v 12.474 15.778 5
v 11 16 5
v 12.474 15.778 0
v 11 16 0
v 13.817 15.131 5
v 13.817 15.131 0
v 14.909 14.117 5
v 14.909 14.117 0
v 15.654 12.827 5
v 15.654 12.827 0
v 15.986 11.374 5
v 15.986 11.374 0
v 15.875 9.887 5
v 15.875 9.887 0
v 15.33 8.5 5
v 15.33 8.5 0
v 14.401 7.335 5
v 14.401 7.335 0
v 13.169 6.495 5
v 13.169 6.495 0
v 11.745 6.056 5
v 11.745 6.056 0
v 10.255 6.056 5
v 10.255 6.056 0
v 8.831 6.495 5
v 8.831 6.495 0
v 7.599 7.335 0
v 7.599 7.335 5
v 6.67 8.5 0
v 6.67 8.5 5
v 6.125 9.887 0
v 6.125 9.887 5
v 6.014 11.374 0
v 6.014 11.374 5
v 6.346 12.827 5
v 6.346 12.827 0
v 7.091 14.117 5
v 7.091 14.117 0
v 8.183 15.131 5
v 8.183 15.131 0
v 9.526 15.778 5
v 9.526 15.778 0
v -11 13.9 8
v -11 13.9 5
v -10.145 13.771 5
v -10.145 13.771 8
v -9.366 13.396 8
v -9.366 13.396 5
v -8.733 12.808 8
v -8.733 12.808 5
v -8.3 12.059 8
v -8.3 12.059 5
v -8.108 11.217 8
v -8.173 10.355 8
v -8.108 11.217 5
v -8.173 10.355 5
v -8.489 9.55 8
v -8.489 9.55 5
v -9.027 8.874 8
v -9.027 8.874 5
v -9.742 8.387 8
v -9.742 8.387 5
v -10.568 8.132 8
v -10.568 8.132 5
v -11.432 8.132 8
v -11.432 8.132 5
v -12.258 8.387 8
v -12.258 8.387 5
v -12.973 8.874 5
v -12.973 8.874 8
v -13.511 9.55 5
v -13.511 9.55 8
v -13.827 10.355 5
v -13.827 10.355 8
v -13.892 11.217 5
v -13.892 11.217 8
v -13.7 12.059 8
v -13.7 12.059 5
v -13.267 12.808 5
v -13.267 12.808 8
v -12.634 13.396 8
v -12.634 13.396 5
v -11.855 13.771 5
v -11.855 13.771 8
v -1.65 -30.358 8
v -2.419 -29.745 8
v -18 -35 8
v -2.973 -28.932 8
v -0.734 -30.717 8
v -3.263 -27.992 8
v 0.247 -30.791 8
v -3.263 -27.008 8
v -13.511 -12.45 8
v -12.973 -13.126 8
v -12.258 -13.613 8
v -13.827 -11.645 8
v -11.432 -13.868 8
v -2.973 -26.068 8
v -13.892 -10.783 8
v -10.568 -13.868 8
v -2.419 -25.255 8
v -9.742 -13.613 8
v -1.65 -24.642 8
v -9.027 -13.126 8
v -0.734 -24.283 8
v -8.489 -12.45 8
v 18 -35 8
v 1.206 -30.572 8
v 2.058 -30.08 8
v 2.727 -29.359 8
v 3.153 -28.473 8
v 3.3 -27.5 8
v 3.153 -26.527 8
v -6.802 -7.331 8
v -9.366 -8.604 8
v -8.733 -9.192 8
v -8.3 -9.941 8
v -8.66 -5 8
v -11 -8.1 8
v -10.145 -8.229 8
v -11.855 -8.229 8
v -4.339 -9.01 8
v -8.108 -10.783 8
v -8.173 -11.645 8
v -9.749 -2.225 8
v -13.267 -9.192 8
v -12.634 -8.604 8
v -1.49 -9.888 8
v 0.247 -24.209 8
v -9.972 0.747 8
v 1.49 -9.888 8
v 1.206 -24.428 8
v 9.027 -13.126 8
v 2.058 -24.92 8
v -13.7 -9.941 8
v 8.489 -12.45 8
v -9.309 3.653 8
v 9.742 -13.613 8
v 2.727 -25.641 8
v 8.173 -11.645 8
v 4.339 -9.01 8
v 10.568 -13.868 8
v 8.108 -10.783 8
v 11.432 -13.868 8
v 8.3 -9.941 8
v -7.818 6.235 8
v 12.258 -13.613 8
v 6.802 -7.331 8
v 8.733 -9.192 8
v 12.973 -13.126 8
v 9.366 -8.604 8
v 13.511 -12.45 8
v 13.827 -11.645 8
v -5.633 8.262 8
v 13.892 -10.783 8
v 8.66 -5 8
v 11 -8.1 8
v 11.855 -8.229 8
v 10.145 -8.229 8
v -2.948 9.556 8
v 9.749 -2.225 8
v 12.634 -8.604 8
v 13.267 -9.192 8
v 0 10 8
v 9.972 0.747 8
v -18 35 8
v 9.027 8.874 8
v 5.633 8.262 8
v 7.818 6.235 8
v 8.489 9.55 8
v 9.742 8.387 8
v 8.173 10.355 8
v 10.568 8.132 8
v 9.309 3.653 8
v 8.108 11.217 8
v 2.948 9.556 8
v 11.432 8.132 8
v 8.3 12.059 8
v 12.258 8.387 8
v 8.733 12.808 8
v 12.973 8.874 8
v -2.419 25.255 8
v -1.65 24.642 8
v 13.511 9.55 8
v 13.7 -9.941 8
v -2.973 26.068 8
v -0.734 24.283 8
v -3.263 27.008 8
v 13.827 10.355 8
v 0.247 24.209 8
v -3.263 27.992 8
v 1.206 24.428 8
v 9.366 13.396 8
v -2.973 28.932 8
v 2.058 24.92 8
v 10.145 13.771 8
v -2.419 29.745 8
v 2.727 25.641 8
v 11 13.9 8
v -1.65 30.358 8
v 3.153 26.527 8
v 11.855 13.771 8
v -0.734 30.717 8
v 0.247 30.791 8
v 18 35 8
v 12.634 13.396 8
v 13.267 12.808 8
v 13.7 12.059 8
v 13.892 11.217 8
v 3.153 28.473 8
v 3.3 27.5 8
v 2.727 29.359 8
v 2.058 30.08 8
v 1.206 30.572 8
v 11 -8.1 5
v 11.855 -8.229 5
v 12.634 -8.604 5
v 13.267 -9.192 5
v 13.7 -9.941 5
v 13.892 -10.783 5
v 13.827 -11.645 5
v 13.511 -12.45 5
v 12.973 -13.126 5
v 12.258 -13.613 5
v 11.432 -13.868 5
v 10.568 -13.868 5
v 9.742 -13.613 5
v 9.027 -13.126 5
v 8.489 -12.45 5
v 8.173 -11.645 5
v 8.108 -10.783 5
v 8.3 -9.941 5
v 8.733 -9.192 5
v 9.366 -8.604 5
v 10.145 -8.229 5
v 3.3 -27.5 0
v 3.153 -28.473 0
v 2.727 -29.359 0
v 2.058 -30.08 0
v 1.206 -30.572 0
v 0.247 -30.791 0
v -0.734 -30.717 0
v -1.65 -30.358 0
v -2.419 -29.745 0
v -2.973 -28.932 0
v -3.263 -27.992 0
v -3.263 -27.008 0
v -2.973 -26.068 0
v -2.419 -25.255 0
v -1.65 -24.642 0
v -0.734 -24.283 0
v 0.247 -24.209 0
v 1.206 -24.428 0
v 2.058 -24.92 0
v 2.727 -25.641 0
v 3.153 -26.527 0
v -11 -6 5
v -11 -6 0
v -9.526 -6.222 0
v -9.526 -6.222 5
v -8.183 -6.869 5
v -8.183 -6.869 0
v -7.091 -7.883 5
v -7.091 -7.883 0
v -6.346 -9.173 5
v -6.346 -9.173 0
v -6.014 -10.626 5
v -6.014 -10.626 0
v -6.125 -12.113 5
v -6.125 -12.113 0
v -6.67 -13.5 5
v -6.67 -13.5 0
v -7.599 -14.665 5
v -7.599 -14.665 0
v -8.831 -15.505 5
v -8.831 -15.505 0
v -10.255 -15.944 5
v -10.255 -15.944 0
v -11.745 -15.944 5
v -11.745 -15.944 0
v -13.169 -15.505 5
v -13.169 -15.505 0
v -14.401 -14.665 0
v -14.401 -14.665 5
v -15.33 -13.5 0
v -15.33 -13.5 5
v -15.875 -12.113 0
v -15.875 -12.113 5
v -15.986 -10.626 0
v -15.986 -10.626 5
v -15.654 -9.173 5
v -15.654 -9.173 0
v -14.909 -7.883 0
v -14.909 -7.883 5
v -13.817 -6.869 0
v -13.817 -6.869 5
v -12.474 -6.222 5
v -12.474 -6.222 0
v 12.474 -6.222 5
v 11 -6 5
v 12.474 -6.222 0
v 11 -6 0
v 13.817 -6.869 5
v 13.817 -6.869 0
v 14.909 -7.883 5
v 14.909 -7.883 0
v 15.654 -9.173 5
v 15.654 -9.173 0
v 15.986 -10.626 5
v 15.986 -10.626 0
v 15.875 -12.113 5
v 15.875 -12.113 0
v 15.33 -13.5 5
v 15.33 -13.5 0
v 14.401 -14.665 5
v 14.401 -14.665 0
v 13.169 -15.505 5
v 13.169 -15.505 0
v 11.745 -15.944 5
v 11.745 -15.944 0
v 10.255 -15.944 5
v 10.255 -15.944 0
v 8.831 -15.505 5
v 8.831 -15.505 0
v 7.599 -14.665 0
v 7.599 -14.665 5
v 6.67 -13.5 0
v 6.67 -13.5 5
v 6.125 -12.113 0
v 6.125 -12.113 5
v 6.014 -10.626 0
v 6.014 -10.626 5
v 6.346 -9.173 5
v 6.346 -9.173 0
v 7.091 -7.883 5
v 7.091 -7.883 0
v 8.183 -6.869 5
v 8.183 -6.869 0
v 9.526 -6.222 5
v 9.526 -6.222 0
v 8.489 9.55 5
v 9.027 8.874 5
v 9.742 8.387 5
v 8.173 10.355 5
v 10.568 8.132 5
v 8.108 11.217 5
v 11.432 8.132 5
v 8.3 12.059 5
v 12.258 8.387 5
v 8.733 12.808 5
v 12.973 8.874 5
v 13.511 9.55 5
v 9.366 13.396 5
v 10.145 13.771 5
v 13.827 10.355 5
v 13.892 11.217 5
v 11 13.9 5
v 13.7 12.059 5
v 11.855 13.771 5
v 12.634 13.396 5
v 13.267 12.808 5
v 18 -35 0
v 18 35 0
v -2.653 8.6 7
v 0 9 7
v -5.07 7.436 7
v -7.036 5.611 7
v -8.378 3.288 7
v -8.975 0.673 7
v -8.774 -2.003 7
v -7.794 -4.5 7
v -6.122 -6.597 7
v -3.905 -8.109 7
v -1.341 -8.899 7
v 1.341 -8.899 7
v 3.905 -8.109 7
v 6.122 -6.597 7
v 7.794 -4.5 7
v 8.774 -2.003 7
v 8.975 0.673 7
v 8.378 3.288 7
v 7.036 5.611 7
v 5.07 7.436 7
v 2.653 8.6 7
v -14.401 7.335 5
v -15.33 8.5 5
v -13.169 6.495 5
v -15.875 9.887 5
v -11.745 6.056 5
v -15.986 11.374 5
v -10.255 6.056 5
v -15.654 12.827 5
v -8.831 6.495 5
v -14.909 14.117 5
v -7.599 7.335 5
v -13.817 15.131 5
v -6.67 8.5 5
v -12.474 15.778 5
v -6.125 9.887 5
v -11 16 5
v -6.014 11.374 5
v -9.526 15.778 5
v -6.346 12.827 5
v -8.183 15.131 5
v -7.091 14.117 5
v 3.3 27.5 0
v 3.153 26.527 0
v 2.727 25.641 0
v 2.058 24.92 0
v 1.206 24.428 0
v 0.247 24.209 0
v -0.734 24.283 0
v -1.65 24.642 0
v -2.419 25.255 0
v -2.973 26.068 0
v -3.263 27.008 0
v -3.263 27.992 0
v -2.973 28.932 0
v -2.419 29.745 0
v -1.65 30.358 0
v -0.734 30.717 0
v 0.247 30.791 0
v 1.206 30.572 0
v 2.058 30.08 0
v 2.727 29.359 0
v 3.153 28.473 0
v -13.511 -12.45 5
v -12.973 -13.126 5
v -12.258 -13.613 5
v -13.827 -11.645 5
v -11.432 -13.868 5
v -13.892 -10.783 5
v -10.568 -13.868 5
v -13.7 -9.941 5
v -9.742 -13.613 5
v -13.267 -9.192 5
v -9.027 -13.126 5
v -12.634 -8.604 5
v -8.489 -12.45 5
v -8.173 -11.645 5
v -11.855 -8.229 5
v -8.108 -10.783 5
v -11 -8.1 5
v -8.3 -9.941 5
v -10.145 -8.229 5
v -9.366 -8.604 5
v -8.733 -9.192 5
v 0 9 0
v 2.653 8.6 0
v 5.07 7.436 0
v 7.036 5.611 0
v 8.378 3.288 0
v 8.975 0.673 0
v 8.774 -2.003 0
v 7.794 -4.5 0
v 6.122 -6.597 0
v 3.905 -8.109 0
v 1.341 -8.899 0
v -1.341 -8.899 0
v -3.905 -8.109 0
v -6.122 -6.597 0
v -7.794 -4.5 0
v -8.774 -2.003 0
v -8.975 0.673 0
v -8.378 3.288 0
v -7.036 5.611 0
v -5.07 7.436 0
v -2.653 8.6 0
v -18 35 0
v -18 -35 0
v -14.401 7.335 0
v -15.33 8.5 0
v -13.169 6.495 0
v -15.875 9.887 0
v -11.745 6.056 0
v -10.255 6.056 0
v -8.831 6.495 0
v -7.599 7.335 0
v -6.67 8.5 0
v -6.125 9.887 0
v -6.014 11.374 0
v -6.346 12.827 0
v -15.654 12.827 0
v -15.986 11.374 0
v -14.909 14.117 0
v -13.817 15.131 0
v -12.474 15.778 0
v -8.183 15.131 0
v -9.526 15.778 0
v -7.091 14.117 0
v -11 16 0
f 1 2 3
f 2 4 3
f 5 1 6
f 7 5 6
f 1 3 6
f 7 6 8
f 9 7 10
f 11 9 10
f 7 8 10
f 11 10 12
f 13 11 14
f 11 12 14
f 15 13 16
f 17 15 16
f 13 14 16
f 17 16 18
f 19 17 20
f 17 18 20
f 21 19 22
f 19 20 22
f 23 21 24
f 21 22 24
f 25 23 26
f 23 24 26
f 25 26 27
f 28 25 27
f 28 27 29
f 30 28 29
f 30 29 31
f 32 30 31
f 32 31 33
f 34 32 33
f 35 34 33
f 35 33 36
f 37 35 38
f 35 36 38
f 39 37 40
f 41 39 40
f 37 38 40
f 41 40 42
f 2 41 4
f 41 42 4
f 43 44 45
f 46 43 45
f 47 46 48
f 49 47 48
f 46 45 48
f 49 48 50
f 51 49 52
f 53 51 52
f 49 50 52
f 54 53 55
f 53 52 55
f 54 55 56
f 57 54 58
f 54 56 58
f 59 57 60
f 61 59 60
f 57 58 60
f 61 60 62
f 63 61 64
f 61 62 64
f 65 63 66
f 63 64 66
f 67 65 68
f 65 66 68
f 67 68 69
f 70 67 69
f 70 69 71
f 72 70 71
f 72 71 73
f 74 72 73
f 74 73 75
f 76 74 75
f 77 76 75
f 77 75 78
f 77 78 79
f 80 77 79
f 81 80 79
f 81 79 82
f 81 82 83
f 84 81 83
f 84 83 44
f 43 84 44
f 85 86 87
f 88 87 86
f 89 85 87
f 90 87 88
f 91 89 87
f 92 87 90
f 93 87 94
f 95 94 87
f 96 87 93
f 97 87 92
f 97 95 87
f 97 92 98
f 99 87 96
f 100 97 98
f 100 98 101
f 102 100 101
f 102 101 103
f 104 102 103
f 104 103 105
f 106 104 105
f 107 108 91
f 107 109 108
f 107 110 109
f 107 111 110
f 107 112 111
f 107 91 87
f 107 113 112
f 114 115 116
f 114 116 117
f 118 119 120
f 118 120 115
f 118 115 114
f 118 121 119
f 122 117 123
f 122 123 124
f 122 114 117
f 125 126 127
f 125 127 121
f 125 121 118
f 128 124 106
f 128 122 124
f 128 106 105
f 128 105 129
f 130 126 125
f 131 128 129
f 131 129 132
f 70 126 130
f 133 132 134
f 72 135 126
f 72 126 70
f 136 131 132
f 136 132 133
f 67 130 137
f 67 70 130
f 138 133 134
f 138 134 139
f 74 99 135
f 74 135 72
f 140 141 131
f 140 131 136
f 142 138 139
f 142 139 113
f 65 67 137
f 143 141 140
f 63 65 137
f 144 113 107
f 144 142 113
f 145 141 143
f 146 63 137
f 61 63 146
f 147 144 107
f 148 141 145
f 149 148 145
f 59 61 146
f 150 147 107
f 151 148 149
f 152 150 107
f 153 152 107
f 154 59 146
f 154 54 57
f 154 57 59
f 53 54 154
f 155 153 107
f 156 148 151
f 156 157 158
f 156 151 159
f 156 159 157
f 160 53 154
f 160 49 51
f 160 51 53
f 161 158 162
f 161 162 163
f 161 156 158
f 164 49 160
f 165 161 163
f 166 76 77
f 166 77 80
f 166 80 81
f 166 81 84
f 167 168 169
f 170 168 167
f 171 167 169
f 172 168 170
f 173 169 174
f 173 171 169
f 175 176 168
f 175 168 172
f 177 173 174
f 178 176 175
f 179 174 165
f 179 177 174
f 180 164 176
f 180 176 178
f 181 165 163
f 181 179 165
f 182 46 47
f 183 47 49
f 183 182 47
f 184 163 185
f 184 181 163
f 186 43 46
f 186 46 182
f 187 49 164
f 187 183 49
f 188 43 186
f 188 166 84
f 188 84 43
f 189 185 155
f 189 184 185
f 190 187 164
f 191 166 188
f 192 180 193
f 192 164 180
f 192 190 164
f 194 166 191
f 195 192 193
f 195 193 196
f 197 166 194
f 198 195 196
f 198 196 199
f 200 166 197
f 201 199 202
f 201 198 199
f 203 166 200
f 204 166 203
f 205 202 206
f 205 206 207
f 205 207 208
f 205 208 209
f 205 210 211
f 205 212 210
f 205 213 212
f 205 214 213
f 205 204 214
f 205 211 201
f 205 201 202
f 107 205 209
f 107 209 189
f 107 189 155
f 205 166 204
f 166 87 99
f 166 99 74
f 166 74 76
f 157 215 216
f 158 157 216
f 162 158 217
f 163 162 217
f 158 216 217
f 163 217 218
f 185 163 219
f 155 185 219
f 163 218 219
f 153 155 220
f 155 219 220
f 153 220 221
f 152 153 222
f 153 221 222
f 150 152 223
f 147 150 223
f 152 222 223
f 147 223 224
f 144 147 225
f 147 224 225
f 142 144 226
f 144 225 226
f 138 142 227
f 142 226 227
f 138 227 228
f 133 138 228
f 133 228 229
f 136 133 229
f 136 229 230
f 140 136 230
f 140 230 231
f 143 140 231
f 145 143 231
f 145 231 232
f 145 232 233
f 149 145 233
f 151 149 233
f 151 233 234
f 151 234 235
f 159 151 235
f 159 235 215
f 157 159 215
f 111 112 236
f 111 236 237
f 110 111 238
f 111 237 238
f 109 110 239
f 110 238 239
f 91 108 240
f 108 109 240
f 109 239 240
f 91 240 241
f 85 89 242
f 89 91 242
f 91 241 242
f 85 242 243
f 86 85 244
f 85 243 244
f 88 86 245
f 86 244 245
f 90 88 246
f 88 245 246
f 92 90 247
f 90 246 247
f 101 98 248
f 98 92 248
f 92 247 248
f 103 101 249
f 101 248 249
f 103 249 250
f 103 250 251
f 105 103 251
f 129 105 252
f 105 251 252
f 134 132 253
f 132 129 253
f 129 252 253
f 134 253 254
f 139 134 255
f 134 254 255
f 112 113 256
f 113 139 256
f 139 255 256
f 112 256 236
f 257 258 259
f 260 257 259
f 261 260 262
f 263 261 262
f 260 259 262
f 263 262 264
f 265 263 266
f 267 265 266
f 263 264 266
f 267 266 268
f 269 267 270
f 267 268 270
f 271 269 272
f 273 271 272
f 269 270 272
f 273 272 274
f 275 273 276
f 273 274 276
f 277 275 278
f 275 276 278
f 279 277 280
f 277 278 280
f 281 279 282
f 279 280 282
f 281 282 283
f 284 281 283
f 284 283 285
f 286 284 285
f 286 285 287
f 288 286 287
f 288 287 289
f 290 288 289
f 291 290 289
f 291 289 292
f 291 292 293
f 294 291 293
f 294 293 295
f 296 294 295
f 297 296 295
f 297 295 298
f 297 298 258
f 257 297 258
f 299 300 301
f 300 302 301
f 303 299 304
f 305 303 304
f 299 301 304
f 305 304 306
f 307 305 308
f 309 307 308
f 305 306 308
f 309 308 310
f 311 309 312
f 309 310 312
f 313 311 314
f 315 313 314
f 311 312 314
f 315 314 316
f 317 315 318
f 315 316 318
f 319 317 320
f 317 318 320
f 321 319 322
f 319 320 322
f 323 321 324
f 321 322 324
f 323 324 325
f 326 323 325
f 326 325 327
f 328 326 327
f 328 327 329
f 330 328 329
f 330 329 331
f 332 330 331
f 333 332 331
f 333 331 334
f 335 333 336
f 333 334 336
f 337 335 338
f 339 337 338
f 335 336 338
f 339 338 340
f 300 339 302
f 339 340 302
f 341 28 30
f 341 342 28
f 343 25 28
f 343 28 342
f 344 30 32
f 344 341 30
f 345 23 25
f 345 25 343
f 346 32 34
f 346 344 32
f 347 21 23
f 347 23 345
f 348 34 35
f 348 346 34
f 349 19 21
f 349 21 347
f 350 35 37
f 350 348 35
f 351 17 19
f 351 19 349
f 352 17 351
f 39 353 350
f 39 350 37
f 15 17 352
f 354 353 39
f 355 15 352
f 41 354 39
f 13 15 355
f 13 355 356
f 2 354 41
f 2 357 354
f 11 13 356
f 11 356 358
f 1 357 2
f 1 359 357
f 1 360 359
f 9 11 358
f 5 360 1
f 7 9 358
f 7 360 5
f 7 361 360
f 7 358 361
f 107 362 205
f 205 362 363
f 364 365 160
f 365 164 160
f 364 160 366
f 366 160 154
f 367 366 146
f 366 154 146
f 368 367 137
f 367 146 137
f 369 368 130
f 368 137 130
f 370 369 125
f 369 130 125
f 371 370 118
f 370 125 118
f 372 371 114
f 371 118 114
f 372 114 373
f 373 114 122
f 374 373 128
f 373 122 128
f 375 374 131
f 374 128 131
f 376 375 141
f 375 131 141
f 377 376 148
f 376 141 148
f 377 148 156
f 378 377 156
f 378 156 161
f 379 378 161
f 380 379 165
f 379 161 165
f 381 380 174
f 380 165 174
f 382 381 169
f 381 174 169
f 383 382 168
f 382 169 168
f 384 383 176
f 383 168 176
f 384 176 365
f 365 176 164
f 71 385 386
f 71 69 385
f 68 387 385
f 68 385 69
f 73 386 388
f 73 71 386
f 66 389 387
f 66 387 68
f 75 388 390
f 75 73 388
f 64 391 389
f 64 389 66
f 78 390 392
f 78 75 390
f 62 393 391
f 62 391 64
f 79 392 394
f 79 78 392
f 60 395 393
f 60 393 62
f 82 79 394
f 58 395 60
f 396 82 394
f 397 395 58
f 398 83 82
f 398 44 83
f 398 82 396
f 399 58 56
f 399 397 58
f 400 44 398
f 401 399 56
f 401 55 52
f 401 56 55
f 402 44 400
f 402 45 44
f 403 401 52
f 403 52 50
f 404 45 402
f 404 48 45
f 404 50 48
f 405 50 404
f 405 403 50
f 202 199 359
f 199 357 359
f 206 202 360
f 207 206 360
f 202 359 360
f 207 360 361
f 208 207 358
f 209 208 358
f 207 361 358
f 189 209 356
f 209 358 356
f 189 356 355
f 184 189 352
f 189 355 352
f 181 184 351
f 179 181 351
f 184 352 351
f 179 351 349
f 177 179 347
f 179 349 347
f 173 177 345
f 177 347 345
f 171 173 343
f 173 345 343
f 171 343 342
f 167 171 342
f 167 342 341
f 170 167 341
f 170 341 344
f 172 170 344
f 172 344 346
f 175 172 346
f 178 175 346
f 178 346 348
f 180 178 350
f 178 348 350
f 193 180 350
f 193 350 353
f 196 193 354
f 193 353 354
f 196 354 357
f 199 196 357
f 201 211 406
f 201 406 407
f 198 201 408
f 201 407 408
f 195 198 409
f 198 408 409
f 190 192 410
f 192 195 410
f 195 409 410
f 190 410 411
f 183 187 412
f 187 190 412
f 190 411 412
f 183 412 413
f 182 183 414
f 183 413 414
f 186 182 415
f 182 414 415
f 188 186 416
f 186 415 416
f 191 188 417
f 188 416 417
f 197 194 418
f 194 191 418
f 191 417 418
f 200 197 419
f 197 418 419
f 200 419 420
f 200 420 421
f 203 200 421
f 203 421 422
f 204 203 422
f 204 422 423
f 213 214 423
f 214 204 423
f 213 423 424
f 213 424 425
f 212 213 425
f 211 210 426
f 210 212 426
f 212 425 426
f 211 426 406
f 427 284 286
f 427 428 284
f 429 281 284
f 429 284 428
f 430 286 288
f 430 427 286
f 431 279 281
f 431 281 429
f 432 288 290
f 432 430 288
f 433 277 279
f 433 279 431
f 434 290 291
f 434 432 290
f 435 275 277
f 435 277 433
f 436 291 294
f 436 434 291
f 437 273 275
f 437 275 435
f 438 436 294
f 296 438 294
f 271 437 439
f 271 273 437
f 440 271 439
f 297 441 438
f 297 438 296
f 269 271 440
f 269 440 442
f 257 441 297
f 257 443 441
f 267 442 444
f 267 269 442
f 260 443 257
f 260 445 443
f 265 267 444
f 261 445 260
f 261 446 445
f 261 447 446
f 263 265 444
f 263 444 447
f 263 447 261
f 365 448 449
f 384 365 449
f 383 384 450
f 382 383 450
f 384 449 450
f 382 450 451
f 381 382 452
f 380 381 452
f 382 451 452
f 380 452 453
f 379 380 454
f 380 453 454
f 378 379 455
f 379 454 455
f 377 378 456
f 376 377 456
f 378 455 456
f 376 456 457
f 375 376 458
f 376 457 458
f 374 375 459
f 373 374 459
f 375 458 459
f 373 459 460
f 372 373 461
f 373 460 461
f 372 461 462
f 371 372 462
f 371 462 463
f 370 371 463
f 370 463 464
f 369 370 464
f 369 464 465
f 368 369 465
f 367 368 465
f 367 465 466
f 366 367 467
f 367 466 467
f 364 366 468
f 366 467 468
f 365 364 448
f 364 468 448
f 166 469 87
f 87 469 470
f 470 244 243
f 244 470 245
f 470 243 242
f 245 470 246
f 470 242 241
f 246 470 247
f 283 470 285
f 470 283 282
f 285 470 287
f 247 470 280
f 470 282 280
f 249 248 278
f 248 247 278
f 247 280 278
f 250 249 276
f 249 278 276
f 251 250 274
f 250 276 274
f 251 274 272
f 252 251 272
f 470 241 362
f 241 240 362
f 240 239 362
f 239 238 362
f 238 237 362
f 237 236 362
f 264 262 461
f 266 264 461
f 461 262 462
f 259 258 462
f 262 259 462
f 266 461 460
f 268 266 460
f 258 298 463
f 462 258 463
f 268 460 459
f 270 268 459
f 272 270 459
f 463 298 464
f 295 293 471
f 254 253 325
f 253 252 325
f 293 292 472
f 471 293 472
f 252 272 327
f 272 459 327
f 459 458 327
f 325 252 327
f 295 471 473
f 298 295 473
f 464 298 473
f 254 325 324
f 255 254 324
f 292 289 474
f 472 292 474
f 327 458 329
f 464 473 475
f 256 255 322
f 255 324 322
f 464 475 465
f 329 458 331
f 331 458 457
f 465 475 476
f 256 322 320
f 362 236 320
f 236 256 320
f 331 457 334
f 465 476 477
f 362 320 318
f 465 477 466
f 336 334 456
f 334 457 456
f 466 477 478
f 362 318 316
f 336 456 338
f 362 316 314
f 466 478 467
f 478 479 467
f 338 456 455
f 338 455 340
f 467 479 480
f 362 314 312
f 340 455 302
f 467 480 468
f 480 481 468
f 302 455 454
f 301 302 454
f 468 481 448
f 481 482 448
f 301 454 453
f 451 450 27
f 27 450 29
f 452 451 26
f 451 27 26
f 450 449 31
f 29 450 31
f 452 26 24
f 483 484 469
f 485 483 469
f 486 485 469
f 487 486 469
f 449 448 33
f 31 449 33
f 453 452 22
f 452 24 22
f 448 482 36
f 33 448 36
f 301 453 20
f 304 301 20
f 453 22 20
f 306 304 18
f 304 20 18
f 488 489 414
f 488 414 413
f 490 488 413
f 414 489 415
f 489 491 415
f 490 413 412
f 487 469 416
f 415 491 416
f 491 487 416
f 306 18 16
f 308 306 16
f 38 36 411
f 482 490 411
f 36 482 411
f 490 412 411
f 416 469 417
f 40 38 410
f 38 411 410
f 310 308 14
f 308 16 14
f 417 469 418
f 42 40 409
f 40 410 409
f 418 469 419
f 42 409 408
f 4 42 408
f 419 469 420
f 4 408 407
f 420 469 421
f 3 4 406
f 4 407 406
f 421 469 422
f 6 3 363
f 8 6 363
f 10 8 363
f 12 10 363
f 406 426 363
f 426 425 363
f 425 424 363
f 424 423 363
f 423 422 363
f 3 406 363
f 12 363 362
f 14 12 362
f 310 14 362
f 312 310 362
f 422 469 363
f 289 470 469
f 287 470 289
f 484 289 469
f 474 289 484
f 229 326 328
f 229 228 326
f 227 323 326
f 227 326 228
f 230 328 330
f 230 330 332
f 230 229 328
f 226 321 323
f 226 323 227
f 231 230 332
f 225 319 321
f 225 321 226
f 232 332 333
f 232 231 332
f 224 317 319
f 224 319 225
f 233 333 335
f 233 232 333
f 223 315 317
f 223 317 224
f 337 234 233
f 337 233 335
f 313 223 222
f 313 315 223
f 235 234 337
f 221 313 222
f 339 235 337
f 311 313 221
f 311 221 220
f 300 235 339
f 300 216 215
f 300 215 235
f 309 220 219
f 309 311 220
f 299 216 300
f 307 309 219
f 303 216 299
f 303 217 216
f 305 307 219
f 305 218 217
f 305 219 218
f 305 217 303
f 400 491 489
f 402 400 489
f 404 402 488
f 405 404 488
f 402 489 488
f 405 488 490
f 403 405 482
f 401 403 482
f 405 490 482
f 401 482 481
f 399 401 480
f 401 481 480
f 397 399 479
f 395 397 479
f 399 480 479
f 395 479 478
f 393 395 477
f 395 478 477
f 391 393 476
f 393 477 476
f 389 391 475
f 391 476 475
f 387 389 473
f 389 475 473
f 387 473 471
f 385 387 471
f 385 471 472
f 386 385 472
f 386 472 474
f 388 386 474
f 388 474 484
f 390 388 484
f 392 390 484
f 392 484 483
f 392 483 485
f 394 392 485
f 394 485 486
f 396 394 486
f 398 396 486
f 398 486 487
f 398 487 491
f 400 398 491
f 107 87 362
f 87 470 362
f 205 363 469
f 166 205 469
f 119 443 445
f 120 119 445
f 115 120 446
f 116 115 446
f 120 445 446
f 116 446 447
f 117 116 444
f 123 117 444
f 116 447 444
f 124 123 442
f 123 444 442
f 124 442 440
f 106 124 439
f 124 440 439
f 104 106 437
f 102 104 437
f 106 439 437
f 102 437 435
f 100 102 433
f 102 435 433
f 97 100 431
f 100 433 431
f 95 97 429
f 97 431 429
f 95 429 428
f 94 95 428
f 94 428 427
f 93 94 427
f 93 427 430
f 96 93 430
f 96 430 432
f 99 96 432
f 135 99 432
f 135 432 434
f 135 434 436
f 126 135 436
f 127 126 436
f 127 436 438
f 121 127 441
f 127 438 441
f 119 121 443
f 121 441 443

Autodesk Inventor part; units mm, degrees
sketch "Skizze_1" plane through (0, 0, 0) normal (0, 0, 1) x (1, 0, 0)
  line L0 (-18, 35) -> (-18, -35)
  line L1 (-18, -35) -> (18, -35)
  line L2 (18, -35) -> (18, 35)
  line L3 (18, 35) -> (-18, 35)
  circle A0 centre (0, 27.5) radius 3.3
  circle A1 centre (0, -27.5) radius 3.3
extrude "Extrusion1" add sketch "Skizze_1" along normal blind 8
sketch "Skizze_2_ALT_Drilling_1" plane through (0, 0, 0) normal (1, 0, 0) x (0, 1, 0)
  line L0 (0, 0) -> (0, 8)
  line L1 (0, 8) -> (10, 8)
  line L2 (10, 8) -> (9, 7)
  line L3 (9, 7) -> (9, 0)
  line L4 (9, 0) -> (0, 0)
  line L5 (0, 0) -> (0, 8)
revolve "Revolution1" cut sketch "Skizze_2_ALT_Drilling_1" angle 360 about axis through (0, 0, 0) along (0, 0, -1)
sketch "Skizze_3_ALT_Drilling_2" plane through (11, 0, 0) normal (1, 0, 0) x (0, 0, -1)
  line L0 (0, 11) -> (-8, 11)
  line L1 (-8, 11) -> (-8, 13.9)
  line L2 (-8, 13.9) -> (-5, 13.9)
  line L3 (-5, 13.9) -> (-5, 16)
  line L4 (-5, 16) -> (0, 16)
  line L5 (0, 16) -> (0, 11)
  line L6 (0, 11) -> (-8, 11)
revolve "Revolution2" cut sketch "Skizze_3_ALT_Drilling_2" angle 360 about axis through (11, 11, 0) along (0, 0, -1)
sketch "Muster_1_SKETCH_1" plane through (-11, 0, 0) normal (1, 0, 0) x (0, 0, -1)
  line L0 (0, 11) -> (-8, 11)
  line L1 (-8, 11) -> (-8, 13.9)
  line L2 (-8, 13.9) -> (-5, 13.9)
  line L3 (-5, 13.9) -> (-5, 16)
  line L4 (-5, 16) -> (0, 16)
  line L5 (0, 16) -> (0, 11)
  line L6 (0, 11) -> (-8, 11)
sketch "Muster_1_SKETCH_2" plane through (11, 0, 0) normal (1, 0, 0) x (0, 0, -1)
  line L0 (0, -11) -> (-8, -11)
  line L1 (-8, -11) -> (-8, -8.1)
  line L2 (-8, -8.1) -> (-5, -8.1)
  line L3 (-5, -8.1) -> (-5, -6)
  line L4 (-5, -6) -> (0, -6)
  line L5 (0, -6) -> (0, -11)
  line L6 (0, -11) -> (-8, -11)
sketch "Muster_1_SKETCH_3" plane through (-11, 0, 0) normal (1, 0, 0) x (0, 0, -1)
  line L0 (0, -11) -> (-8, -11)
  line L1 (-8, -11) -> (-8, -8.1)
  line L2 (-8, -8.1) -> (-5, -8.1)
  line L3 (-5, -8.1) -> (-5, -6)
  line L4 (-5, -6) -> (0, -6)
  line L5 (0, -6) -> (0, -11)
  line L6 (0, -11) -> (-8, -11)
revolve "Revolution3" cut sketch "Muster_1_SKETCH_1" angle 360 about axis through (-11, 11, 0) along (0, 0, -1)
revolve "Revolution4" cut sketch "Muster_1_SKETCH_2" angle 360 about axis through (11, -11, 0) along (0, 0, -1)
revolve "Revolution5" cut sketch "Muster_1_SKETCH_3" angle 360 about axis through (-11, -11, 0) along (0, 0, -1)
ref_plane "FDT_MOUNT_XY" through (0, 0, 8) normal (0, 0, 1) x (0, 1, 0)
ref_plane "FDT_MOUNT_YZ" through (0, 0, 8) normal (0, 1, 0) x (-1, 0, 0)
ref_plane "FDT_MOUNT_ZX" through (0, 0, 8) normal (-1, 0, 0) x (0, 0, 1)
ref_plane "FNC_1_XY" through (0, 0, 4) normal (0, 0, 1) x (1, 0, 0)
ref_plane "FNC_1_YZ" through (0, 0, 4) normal (1, 0, 0) x (0, 1, 0)
ref_plane "FNC_1_ZX" through (0, 0, 4) normal (0, 1, 0) x (0, 0, 1)
ref_plane "FNC_2_3_XY" through (0, 0, 8) normal (0, 0, 1) x (1, 0, 0)
ref_plane "FNC_2_3_YZ" through (0, 0, 8) normal (1, 0, 0) x (0, 1, 0)
ref_plane "FNC_2_3_ZX" through (0, 0, 8) normal (0, 1, 0) x (0, 0, 1)
ref_plane "FNC_Schraube_1_XY" through (-11, 11, 5) normal (0, 0, 1) x (1, 0, 0)
ref_plane "FNC_Schraube_1_YZ" through (-11, 11, 5) normal (1, 0, 0) x (0, 1, 0)
ref_plane "FNC_Schraube_1_ZX" through (-11, 11, 5) normal (0, 1, 0) x (0, 0, 1)
ref_plane "FNC_Schraube_2_XY" through (11, 11, 5) normal (0, 0, 1) x (1, 0, 0)
ref_plane "FNC_Schraube_2_YZ" through (11, 11, 5) normal (1, 0, 0) x (0, 1, 0)
ref_plane "FNC_Schraube_2_ZX" through (11, 11, 5) normal (0, 1, 0) x (0, 0, 1)
ref_plane "FNC_Schraube_3_XY" through (-11, -11, 5) normal (0, 0, 1) x (1, 0, 0)
ref_plane "FNC_Schraube_3_YZ" through (-11, -11, 5) normal (1, 0, 0) x (0, 1, 0)
ref_plane "FNC_Schraube_3_ZX" through (-11, -11, 5) normal (0, 1, 0) x (0, 0, 1)
ref_plane "FNC_Schraube_4_XY" through (11, -11, 5) normal (0, 0, 1) x (1, 0, 0)
ref_plane "FNC_Schraube_4_YZ" through (11, -11, 5) normal (1, 0, 0) x (0, 1, 0)
ref_plane "FNC_Schraube_4_ZX" through (11, -11, 5) normal (0, 1, 0) x (0, 0, 1)
ref_plane "P17_1_XY" through (0, 27.5, 8) normal (0, 0, 1) x (1, 0, 0)
ref_plane "P17_1_YZ" through (0, 27.5, 8) normal (1, 0, 0) x (0, 1, 0)
ref_plane "P17_1_ZX" through (0, 27.5, 8) normal (0, 1, 0) x (0, 0, 1)
ref_plane "P18_1_XY" through (0, -27.5, 8) normal (0, 0, 1) x (1, 0, 0)
ref_plane "P18_1_YZ" through (0, -27.5, 8) normal (1, 0, 0) x (0, 1, 0)
ref_plane "P18_1_ZX" through (0, -27.5, 8) normal (0, 1, 0) x (0, 0, 1)
properties part number "537247 FNC-20---(F)"
